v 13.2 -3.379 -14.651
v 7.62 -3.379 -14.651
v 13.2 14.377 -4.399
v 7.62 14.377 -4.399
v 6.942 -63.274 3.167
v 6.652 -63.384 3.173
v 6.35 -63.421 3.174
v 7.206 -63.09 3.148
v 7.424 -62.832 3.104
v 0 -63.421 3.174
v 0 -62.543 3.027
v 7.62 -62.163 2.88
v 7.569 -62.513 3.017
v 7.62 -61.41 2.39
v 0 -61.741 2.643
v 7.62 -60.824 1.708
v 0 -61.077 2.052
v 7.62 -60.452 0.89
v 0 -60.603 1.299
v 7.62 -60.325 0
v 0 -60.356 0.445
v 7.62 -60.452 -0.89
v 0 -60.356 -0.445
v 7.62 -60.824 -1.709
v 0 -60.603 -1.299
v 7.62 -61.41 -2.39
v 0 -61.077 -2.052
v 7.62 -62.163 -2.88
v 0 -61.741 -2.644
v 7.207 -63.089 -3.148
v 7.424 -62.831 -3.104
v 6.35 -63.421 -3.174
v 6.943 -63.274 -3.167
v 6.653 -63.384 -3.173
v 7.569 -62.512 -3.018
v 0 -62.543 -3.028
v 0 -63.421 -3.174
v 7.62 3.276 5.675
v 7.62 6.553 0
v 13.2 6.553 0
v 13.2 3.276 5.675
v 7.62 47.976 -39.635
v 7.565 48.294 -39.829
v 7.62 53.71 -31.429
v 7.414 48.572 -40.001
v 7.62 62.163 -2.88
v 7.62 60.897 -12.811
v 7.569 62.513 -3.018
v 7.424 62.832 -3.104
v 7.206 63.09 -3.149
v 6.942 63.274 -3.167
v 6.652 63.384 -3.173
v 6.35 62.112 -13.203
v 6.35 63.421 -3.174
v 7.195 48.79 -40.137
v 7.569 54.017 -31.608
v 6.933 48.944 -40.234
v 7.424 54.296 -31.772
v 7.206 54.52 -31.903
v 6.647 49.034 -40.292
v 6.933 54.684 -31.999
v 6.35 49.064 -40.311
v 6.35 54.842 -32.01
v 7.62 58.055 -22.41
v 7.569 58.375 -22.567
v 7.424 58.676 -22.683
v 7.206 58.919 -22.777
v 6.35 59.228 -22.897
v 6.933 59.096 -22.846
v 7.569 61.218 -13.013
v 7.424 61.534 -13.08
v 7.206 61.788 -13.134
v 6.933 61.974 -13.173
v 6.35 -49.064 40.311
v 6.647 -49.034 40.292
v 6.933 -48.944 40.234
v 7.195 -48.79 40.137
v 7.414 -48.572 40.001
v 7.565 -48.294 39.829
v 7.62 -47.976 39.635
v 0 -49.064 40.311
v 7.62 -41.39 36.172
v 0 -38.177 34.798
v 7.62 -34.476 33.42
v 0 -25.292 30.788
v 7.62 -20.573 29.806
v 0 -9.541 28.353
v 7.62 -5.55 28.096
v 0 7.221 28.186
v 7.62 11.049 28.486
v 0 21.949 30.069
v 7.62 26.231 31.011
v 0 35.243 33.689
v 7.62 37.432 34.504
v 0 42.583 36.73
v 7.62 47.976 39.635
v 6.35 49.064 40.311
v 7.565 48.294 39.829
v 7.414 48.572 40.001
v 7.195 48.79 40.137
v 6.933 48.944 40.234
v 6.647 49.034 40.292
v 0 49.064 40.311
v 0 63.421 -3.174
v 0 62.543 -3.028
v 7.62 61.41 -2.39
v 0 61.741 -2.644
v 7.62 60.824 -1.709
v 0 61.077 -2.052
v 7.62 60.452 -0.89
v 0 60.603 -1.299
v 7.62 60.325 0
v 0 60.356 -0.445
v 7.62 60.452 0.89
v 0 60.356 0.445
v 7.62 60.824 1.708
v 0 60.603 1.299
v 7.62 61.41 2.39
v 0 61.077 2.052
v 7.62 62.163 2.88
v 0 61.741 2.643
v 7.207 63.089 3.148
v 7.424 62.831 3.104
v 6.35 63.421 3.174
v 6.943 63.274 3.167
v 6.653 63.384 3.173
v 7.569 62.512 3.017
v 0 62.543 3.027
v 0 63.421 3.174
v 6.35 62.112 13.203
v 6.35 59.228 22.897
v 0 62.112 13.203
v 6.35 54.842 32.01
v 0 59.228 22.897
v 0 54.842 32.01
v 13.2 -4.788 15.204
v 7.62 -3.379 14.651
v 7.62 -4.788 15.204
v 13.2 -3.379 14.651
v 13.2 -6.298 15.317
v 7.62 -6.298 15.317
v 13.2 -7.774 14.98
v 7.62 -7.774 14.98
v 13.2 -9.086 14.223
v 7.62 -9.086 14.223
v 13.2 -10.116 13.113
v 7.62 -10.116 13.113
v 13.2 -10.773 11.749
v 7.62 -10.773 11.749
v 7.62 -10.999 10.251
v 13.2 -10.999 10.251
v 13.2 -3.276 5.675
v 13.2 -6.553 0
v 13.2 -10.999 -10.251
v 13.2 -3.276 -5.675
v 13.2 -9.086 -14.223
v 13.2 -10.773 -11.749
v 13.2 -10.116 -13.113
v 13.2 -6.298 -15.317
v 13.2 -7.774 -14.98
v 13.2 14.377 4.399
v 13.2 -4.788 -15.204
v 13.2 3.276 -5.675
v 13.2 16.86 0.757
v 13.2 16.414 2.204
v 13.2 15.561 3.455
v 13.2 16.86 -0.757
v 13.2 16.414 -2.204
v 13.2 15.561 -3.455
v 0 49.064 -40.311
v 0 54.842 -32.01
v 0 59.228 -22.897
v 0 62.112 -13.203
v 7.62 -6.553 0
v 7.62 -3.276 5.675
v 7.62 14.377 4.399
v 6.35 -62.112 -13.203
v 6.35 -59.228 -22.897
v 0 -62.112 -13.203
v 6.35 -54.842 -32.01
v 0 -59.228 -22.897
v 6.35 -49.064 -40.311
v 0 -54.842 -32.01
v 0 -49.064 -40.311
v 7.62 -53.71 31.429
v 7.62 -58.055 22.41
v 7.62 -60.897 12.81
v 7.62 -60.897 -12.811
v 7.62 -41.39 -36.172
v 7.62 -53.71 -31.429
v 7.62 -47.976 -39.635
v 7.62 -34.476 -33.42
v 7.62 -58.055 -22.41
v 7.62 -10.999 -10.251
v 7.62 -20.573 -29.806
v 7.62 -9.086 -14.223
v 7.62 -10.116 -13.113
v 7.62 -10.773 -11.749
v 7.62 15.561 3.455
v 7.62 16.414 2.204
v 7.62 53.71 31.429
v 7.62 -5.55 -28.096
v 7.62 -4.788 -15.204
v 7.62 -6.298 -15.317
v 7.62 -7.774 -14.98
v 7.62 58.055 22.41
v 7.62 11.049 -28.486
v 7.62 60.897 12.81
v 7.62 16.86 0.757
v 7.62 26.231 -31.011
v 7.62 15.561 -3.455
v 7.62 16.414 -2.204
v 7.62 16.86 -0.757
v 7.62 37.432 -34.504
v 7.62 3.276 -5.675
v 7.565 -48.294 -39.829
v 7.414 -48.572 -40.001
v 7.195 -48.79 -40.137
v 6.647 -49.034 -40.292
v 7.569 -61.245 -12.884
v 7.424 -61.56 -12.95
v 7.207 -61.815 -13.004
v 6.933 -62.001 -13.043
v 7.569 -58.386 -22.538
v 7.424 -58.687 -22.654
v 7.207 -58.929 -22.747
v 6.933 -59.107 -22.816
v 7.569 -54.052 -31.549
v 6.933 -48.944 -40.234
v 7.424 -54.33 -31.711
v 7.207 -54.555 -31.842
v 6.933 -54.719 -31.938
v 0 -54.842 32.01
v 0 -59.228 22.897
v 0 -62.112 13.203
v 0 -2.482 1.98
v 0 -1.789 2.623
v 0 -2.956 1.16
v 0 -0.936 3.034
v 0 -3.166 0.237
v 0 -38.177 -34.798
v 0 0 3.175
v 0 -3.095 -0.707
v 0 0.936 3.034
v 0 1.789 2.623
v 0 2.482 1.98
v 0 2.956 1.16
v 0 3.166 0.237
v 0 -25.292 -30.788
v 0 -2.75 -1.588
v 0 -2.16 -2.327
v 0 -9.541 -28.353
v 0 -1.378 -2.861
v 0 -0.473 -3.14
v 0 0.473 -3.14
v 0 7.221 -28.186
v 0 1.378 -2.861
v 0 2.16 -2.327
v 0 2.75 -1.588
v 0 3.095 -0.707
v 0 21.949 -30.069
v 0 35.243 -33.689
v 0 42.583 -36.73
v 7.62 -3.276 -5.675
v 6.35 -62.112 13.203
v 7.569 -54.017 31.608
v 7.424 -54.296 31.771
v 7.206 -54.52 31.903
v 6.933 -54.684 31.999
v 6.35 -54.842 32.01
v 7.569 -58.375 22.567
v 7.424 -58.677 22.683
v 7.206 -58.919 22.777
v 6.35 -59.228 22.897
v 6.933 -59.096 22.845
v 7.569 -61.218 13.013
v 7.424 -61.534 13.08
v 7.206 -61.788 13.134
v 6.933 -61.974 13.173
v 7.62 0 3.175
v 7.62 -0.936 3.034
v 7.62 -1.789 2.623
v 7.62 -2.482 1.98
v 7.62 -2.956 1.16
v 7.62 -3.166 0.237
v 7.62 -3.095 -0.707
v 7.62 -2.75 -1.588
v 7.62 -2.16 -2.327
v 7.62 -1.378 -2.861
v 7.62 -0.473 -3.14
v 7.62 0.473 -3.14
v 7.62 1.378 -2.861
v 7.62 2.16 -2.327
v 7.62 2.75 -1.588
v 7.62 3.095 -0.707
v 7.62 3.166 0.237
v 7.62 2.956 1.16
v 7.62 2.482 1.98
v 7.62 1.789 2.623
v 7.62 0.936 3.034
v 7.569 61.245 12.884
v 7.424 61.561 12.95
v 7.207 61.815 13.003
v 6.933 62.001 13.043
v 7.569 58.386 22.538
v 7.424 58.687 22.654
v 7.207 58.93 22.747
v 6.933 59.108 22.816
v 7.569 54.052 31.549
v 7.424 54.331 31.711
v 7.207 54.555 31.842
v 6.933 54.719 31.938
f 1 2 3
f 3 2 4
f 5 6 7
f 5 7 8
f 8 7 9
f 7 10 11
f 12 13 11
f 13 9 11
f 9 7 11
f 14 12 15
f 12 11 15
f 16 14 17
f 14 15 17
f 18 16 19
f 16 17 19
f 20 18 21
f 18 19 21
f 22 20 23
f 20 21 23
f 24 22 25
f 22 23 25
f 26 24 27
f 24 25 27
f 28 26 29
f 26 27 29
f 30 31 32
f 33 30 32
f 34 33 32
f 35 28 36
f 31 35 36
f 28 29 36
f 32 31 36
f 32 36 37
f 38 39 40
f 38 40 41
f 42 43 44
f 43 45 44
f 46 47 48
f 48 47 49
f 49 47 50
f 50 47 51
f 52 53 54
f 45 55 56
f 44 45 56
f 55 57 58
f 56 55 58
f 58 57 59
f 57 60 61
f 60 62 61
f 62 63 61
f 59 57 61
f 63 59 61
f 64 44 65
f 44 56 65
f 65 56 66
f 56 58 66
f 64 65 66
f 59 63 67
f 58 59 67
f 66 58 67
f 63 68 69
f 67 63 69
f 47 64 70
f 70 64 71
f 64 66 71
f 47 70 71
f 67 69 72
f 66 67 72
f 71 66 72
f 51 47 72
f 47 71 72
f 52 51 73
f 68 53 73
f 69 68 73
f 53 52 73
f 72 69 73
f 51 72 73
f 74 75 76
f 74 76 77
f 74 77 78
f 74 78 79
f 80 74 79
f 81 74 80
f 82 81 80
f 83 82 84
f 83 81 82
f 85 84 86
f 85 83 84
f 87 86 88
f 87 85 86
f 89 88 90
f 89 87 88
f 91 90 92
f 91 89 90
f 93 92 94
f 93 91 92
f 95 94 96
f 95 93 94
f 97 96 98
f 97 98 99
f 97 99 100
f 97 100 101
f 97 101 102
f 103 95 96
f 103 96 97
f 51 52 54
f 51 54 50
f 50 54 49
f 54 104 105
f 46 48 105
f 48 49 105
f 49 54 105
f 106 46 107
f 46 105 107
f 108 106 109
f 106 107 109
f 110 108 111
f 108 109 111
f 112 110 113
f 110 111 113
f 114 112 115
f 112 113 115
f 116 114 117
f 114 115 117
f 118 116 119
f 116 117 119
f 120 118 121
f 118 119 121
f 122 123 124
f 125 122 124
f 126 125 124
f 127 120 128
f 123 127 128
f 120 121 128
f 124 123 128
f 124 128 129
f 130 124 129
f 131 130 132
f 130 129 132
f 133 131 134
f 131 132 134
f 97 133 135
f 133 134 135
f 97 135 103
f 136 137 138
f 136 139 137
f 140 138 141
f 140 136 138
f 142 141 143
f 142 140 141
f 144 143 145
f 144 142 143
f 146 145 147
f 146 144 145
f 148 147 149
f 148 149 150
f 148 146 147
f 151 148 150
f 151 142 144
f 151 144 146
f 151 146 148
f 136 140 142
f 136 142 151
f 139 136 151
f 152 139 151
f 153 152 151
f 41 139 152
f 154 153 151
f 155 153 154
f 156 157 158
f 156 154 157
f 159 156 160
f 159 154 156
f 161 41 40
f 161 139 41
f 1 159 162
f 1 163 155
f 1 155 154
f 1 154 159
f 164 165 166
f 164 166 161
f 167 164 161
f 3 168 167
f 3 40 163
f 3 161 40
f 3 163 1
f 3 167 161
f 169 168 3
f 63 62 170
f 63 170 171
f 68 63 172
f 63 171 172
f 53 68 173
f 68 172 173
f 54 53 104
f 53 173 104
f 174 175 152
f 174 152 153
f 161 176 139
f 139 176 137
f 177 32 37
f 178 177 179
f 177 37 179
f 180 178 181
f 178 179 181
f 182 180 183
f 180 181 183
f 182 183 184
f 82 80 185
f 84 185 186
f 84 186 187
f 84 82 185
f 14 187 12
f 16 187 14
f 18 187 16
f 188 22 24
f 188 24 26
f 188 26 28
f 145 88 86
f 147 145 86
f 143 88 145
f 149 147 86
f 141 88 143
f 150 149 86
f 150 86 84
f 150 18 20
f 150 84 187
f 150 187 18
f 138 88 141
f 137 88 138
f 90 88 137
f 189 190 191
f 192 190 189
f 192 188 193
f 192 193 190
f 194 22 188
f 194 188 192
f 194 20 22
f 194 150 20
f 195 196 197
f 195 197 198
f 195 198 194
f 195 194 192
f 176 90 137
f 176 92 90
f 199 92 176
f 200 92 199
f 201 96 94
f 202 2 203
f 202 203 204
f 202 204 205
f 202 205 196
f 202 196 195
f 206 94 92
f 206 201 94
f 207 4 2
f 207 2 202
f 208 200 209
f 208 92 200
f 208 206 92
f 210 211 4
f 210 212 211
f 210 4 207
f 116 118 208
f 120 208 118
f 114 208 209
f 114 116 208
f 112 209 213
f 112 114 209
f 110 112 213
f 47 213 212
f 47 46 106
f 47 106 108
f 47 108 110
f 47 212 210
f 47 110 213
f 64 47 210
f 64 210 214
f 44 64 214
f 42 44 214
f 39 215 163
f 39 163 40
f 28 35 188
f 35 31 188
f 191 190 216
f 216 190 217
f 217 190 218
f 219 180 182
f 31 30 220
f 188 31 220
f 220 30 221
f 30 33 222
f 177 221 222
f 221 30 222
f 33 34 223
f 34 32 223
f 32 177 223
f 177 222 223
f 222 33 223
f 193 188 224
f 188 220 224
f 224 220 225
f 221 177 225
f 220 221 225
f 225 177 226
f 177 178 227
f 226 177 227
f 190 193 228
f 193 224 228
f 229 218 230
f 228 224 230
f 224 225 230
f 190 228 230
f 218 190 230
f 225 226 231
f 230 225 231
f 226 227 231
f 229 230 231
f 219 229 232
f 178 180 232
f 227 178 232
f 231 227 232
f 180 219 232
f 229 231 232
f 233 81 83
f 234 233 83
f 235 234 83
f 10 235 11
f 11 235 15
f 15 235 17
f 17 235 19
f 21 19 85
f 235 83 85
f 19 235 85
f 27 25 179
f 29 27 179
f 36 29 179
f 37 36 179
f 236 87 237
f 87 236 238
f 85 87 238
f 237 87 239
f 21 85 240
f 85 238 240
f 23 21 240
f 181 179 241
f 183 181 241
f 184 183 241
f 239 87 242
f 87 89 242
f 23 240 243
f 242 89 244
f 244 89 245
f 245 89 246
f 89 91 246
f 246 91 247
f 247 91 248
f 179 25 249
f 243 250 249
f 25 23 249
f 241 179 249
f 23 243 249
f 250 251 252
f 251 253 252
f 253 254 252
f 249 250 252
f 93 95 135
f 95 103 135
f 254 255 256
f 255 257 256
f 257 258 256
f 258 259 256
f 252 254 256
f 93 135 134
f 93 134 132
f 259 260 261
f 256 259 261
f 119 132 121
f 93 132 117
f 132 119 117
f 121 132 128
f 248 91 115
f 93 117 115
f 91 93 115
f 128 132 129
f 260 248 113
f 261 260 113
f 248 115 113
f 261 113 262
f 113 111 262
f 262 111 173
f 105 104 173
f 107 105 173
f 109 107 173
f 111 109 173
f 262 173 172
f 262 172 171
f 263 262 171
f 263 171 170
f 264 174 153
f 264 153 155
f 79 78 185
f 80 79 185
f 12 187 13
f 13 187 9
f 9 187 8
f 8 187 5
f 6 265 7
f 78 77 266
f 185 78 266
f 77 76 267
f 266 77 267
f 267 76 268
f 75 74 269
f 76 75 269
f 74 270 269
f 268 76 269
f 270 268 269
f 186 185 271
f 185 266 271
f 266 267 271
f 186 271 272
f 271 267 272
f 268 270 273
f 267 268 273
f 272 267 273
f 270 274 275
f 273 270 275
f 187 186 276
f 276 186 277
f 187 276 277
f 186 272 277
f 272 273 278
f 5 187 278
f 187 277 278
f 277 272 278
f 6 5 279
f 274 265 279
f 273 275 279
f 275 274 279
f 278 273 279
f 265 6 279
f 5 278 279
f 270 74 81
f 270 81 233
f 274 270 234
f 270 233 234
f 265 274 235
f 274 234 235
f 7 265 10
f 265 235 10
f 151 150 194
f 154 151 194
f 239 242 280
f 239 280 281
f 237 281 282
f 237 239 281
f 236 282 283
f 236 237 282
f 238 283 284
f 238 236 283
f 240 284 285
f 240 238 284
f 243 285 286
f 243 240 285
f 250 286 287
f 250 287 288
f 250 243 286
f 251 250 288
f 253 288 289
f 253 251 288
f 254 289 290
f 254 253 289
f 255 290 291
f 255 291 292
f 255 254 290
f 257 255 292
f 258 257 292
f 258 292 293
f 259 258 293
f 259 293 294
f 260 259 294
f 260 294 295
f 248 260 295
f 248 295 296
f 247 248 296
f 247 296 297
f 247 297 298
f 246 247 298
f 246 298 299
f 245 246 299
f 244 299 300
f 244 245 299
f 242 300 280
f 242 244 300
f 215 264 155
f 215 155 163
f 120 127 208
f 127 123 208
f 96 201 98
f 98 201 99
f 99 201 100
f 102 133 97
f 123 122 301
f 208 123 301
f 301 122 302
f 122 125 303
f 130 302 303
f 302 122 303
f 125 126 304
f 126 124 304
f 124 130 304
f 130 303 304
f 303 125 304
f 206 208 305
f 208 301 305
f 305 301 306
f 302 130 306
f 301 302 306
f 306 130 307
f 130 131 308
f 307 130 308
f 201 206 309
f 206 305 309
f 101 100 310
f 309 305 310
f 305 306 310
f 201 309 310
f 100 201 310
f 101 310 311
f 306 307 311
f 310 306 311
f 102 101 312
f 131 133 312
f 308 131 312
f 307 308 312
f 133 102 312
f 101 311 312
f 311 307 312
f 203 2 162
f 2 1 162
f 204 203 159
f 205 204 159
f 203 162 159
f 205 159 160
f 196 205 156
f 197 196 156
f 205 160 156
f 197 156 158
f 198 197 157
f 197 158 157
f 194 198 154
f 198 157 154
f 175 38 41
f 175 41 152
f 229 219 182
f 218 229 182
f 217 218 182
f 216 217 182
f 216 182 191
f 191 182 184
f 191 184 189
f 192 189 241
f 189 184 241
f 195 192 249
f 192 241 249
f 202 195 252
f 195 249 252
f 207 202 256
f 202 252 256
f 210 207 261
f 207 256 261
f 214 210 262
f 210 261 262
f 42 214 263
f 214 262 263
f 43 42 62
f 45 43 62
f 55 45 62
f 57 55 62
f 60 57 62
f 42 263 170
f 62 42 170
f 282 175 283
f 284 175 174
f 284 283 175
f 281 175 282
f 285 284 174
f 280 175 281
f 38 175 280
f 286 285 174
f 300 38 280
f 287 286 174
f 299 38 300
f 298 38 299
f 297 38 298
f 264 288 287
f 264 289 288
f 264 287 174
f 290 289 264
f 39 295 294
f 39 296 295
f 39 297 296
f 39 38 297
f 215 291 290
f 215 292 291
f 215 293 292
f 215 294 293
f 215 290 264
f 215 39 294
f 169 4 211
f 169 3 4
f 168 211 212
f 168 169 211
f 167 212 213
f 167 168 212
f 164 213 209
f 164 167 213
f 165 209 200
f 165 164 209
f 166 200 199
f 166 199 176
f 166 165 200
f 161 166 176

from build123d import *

# Parameters (mm, degrees)
SKETCH2_R           = 3.175
BOSS_EXTRUDE1_DEPTH = 7.62
BOSS_EXTRUDE2_DEPTH = 5.58
FILLET1_R           = 5.08
FILLET3_R           = 1.27
SKETCH4_RX          = 64.751719118
SKETCH4_RY          = 35.535243055
CUT_EXTRUDE1_DEPTH  = 8.89


with BuildPart() as part:
    # Sketch2 → Boss-Extrude1 (new body)
    with BuildSketch(Plane(origin=(0, 0, 0), x_dir=(0, 0, -1), z_dir=(1, 0, 0))):
        with BuildLine():
            ThreePointArc((3.174202727, -63.420615237), (63.5, 0), (3.174202727, 63.420615237))
            ThreePointArc((3.174202727, 63.420615237), (0.000185525, 60.324999039), (-3.173812636, 63.42063476))
            ThreePointArc((-3.173812636, 63.42063476), (-63.5, 0), (-3.173812636, -63.42063476))
            ThreePointArc((-3.173812636, -63.42063476), (0.000185525, -60.324999039), (3.174202727, -63.420615237))
        make_face()
        with Locations(Location((0, 0, 0), (0, 0, 180))):
            Circle(SKETCH2_R, mode=Mode.SUBTRACT)
    extrude(amount=BOSS_EXTRUDE1_DEPTH)

    # Sketch3 → Boss-Extrude2 (add)
    with BuildSketch(Plane(origin=(7.62, 0, 0), x_dir=(0, 0, -1), z_dir=(1, 0, 0))):
        Polygon((19.05, -10.998522628), (0, 21.997045256), (-19.05, -10.998522628), align=None)
        Polygon((-5.675, 3.276462778), (-5.675, -3.276462778), (0, -6.552925555), (5.675, -3.276462778), (5.675, 3.276462778), (0, 6.552925555), align=None, mode=Mode.SUBTRACT)
    extrude(amount=BOSS_EXTRUDE2_DEPTH)

    # Fillet1
    fillet1_edges = [part.edges().sort_by_distance(p)[0] for p in [
        (10.41, -10.998522628, 19.05),
        (10.41, -10.998522628, -19.05),
        (10.41, 21.997045256, 0),
    ]]
    fillet(fillet1_edges, radius=FILLET1_R)

    # Fillet3
    fillet3_edges = [part.edges().sort_by_distance(p)[0] for p in [
        (7.62, 0, -63.5),
        (7.62, 0, 63.5),
    ]]
    fillet(fillet3_edges, radius=FILLET3_R)

    # Sketch4 → Cut-Extrude1 (cut)
    with BuildSketch(Plane.ZY):
        with Locations(Location((-63.5, 0), (0, 0, -90))):
            Ellipse(SKETCH4_RX, SKETCH4_RY)
    cut_extrude1 = extrude(amount=-CUT_EXTRUDE1_DEPTH, mode=Mode.SUBTRACT)

    # Mirror1: Cut-Extrude1 across plane
    add(cut_extrude1.mirror(Plane.XY), mode=Mode.SUBTRACT)


solid = part.part
